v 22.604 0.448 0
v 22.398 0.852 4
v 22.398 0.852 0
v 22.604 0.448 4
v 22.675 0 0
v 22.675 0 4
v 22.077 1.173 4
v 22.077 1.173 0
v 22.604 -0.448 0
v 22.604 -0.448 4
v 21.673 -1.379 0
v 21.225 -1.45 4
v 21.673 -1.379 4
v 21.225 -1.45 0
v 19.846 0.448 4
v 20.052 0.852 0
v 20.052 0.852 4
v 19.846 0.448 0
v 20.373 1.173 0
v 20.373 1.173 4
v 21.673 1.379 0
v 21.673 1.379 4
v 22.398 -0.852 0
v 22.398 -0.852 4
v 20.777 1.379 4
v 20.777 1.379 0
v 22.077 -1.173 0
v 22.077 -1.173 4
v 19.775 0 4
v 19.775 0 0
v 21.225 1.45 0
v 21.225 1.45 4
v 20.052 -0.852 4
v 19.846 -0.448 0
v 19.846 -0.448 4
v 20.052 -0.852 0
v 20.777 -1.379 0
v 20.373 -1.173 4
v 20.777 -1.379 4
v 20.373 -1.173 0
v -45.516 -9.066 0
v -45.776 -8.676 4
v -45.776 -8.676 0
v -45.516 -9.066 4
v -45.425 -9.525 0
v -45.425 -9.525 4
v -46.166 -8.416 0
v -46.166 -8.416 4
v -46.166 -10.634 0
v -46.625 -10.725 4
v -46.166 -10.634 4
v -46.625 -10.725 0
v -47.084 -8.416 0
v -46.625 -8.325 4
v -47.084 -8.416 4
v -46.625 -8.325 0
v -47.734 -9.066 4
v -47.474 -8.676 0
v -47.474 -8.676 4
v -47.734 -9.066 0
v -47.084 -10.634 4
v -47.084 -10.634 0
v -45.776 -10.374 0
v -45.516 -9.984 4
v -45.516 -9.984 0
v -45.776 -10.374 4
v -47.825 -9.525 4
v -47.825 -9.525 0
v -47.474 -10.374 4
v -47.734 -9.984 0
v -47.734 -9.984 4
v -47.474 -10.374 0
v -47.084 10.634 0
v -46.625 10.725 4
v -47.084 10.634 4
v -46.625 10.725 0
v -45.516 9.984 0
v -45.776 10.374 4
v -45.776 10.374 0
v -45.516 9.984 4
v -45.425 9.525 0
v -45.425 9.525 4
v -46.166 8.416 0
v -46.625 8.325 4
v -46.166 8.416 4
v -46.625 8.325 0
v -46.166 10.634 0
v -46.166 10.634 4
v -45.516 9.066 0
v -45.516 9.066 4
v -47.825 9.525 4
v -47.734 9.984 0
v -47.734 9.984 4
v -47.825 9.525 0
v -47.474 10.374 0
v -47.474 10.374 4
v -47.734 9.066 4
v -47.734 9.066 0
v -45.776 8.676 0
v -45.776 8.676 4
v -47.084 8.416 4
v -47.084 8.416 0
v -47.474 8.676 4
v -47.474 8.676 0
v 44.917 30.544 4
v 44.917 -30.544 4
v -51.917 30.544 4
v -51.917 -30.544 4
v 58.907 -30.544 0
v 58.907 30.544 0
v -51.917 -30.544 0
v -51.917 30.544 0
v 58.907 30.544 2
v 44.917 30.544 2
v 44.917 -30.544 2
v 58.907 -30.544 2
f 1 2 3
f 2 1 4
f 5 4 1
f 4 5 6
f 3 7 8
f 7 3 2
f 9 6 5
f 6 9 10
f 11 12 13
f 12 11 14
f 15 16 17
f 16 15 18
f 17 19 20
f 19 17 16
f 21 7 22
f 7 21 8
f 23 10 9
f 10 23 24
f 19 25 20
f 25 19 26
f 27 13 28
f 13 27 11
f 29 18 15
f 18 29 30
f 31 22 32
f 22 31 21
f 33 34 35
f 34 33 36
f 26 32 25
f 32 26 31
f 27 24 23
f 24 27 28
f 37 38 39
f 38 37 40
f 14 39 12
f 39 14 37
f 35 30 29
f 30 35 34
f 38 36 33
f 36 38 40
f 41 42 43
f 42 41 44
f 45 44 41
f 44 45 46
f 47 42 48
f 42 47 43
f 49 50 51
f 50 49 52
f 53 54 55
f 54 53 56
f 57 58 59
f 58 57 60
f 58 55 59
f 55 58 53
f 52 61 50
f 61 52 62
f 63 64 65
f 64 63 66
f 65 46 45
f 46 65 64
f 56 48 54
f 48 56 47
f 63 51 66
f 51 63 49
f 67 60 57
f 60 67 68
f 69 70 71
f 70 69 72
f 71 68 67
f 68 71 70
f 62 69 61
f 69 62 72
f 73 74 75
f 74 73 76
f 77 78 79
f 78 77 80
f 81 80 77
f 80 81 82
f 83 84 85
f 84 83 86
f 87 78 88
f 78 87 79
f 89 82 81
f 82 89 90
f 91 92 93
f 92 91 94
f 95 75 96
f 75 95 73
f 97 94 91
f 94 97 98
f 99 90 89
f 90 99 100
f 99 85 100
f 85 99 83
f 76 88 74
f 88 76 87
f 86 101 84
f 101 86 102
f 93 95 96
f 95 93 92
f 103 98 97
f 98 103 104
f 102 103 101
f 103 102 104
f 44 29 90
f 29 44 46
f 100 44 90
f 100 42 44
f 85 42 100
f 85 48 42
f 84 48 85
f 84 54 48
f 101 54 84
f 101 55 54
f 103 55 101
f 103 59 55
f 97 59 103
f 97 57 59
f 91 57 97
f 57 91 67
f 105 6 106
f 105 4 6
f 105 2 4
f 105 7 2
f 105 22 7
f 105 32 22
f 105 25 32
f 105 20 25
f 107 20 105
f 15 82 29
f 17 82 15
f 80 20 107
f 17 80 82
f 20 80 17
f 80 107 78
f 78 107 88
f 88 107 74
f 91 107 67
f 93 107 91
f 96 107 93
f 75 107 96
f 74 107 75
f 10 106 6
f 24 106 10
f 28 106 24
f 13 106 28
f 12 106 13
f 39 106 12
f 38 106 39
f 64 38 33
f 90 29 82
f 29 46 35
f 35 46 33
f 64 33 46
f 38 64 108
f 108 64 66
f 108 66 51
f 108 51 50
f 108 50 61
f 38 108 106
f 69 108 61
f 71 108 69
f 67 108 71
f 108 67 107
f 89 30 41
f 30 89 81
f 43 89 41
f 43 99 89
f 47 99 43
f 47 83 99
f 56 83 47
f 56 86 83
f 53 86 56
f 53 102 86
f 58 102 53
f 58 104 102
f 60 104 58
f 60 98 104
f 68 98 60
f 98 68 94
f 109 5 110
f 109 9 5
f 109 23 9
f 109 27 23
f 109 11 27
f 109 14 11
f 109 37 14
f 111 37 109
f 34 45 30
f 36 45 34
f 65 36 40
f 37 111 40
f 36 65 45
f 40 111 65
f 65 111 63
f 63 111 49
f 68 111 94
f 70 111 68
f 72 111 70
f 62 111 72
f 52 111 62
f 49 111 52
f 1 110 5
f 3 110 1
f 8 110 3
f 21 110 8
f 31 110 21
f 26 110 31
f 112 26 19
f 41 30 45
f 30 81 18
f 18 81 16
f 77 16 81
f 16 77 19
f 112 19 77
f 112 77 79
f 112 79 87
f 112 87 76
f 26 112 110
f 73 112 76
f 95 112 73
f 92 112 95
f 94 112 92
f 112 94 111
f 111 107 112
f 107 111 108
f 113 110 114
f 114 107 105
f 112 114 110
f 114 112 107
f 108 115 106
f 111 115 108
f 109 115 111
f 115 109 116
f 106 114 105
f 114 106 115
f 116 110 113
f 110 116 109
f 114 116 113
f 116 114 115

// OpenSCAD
// file: ../../library/e7_all.scad
// ==========================================================================
//  e7_all.scad - include this one file. Preview, print plates and the report.
// ==========================================================================
include <e7_params.scad>
include <e7_body.scad>

// whole painted loco
module e7_preview() {
  // carbody in its paint bands
  for (i = [0:len(PAINT_BANDS) - 1]) {
    z0 = i == 0 ? -1 : p(PAINT_BANDS[i - 1][0]);
    z1 = i == len(PAINT_BANDS) - 1 ? 1000 : p(PAINT_BANDS[i][0]);
    color(PAINT_BANDS[i][1]) render(convexity = 8) e7_shell_solid([z0, z1]);
  }
  color(C_GLASS) e7_glass();
  color(C_LENS) let (d = nose_d_at_z(HEADLIGHT[0]))
    translate([XF - p(d) + p(HEADLIGHT[2]) + p(1.5), 0, p(HEADLIGHT[0])]) rotate([0, 90, 0]) cylinder(d = p(HEADLIGHT[1]) - 0.8, h = 0.5, $fn = 32);
  color(C_FRAME) { for (j = [1:NFRAME]) e7_frame_piece(j); e7_pilot(); e7_pilot_rear(); }
  for (tx = [TRK_X, -TRK_X]) translate([tx, 0, 0]) { color(C_TRUCK) e7_truck_frame(); color(C_WHEEL) e7_wheels(); }
}
// thin glass panes sitting in the window pockets (preview only)
module e7_glass() {
  intersection() { e7_loft(DET * 0.6); union() { e7_windshield_cut(); e7_side_cuts_windows_only(); } }
}
module e7_side_cuts_windows_only() {
  for (s = [-1, 1], w = CAB_WIN)
    translate([XF - p(w[1]), s * HW - (s > 0 ? DET : 3 - DET), p(w[2])]) cube([p(w[1] - w[0]), 3, p(w[3] - w[2])]);
}

// one print, laid out for the printer
module e7_plate(part) {
  sec = [for (k = [1:NSEC]) str("body_", k)];
  frm = [for (j = [1:NFRAME]) str("frame_", j)];
  if (is_num(search([part], sec)[0])) {
    k = search([part], sec)[0] + 1;
    // stand the section on its open bottom (skirt edge on the bed)
    translate([-sec_x0(k) - SEC_L / 2, 0, -Z_SKIRT]) e7_body_section(k);
  } else if (is_num(search([part], frm)[0])) {
    j = search([part], frm)[0] + 1;
    xs = concat([FRAME_X0], FRAME_SPLITS, [FRAME_X1]);
    translate([-(xs[j - 1] + xs[j]) / 2, 0, -Z_FRAME_BOT]) e7_frame_piece(j);
  } else if (part == "pilot") {
    translate([-XF, 0, 0]) rotate([0, 0, 0]) translate([0, 0, -p(5)]) e7_pilot();
  } else if (part == "pilot_rear") {
    translate([-XR, 0, 0]) translate([0, 0, -(CPL_Z - CPL_H / 2 - WALL)]) e7_pilot_rear();
  } else if (part == "truck") {
    // upside down, bolster on the bed
    translate([0, 0, Z_FRAME_BOT - 0.3]) rotate([180, 0, 0]) e7_truck_frame();
  } else {
    assert(false, str("unknown part '", part, "'"));
  }
}

module e7_report() {
  echo(str("MILW E7A ", ROAD_NO, " class ", CLASS, " - ", SC, " scale 1:", RATIO, ", paint ", PAINT));
  echo(str("  carbody ", round(BL), " mm long, ", round(2 * HW), " mm wide, roof ", round(Z_ROOF), " mm, cab ", round(Z_CAB), " mm above rail"));
  echo(str("  ", NSEC, " body sections of ", round(SEC_L), " mm; ", NFRAME, " frame pieces; trucks at +/- ", round(TRK_X), " mm"));
  echo(str("  body screws ", SCREW_BODY_NAME, " x ", 2 * len(BOSS_X), "; truck pivots ", PIVOT[1], "; wheels ", round(WHEEL_D * 10) / 10, " mm (bought)"));
}
// main file
// Milwaukee Road E7A, O scale 1-48 - print 3 of 8: frame_1 - frame plate piece 1 (rear; print flat)
// Render (F6), export STL, print. Settings: ../../library/e7_params.scad
// Whole loco preview and notes: ../../MILW_E7_Main.scad
SCALE_SEL = "O";
include <../../library/e7_all.scad>
e7_plate("frame_1");
